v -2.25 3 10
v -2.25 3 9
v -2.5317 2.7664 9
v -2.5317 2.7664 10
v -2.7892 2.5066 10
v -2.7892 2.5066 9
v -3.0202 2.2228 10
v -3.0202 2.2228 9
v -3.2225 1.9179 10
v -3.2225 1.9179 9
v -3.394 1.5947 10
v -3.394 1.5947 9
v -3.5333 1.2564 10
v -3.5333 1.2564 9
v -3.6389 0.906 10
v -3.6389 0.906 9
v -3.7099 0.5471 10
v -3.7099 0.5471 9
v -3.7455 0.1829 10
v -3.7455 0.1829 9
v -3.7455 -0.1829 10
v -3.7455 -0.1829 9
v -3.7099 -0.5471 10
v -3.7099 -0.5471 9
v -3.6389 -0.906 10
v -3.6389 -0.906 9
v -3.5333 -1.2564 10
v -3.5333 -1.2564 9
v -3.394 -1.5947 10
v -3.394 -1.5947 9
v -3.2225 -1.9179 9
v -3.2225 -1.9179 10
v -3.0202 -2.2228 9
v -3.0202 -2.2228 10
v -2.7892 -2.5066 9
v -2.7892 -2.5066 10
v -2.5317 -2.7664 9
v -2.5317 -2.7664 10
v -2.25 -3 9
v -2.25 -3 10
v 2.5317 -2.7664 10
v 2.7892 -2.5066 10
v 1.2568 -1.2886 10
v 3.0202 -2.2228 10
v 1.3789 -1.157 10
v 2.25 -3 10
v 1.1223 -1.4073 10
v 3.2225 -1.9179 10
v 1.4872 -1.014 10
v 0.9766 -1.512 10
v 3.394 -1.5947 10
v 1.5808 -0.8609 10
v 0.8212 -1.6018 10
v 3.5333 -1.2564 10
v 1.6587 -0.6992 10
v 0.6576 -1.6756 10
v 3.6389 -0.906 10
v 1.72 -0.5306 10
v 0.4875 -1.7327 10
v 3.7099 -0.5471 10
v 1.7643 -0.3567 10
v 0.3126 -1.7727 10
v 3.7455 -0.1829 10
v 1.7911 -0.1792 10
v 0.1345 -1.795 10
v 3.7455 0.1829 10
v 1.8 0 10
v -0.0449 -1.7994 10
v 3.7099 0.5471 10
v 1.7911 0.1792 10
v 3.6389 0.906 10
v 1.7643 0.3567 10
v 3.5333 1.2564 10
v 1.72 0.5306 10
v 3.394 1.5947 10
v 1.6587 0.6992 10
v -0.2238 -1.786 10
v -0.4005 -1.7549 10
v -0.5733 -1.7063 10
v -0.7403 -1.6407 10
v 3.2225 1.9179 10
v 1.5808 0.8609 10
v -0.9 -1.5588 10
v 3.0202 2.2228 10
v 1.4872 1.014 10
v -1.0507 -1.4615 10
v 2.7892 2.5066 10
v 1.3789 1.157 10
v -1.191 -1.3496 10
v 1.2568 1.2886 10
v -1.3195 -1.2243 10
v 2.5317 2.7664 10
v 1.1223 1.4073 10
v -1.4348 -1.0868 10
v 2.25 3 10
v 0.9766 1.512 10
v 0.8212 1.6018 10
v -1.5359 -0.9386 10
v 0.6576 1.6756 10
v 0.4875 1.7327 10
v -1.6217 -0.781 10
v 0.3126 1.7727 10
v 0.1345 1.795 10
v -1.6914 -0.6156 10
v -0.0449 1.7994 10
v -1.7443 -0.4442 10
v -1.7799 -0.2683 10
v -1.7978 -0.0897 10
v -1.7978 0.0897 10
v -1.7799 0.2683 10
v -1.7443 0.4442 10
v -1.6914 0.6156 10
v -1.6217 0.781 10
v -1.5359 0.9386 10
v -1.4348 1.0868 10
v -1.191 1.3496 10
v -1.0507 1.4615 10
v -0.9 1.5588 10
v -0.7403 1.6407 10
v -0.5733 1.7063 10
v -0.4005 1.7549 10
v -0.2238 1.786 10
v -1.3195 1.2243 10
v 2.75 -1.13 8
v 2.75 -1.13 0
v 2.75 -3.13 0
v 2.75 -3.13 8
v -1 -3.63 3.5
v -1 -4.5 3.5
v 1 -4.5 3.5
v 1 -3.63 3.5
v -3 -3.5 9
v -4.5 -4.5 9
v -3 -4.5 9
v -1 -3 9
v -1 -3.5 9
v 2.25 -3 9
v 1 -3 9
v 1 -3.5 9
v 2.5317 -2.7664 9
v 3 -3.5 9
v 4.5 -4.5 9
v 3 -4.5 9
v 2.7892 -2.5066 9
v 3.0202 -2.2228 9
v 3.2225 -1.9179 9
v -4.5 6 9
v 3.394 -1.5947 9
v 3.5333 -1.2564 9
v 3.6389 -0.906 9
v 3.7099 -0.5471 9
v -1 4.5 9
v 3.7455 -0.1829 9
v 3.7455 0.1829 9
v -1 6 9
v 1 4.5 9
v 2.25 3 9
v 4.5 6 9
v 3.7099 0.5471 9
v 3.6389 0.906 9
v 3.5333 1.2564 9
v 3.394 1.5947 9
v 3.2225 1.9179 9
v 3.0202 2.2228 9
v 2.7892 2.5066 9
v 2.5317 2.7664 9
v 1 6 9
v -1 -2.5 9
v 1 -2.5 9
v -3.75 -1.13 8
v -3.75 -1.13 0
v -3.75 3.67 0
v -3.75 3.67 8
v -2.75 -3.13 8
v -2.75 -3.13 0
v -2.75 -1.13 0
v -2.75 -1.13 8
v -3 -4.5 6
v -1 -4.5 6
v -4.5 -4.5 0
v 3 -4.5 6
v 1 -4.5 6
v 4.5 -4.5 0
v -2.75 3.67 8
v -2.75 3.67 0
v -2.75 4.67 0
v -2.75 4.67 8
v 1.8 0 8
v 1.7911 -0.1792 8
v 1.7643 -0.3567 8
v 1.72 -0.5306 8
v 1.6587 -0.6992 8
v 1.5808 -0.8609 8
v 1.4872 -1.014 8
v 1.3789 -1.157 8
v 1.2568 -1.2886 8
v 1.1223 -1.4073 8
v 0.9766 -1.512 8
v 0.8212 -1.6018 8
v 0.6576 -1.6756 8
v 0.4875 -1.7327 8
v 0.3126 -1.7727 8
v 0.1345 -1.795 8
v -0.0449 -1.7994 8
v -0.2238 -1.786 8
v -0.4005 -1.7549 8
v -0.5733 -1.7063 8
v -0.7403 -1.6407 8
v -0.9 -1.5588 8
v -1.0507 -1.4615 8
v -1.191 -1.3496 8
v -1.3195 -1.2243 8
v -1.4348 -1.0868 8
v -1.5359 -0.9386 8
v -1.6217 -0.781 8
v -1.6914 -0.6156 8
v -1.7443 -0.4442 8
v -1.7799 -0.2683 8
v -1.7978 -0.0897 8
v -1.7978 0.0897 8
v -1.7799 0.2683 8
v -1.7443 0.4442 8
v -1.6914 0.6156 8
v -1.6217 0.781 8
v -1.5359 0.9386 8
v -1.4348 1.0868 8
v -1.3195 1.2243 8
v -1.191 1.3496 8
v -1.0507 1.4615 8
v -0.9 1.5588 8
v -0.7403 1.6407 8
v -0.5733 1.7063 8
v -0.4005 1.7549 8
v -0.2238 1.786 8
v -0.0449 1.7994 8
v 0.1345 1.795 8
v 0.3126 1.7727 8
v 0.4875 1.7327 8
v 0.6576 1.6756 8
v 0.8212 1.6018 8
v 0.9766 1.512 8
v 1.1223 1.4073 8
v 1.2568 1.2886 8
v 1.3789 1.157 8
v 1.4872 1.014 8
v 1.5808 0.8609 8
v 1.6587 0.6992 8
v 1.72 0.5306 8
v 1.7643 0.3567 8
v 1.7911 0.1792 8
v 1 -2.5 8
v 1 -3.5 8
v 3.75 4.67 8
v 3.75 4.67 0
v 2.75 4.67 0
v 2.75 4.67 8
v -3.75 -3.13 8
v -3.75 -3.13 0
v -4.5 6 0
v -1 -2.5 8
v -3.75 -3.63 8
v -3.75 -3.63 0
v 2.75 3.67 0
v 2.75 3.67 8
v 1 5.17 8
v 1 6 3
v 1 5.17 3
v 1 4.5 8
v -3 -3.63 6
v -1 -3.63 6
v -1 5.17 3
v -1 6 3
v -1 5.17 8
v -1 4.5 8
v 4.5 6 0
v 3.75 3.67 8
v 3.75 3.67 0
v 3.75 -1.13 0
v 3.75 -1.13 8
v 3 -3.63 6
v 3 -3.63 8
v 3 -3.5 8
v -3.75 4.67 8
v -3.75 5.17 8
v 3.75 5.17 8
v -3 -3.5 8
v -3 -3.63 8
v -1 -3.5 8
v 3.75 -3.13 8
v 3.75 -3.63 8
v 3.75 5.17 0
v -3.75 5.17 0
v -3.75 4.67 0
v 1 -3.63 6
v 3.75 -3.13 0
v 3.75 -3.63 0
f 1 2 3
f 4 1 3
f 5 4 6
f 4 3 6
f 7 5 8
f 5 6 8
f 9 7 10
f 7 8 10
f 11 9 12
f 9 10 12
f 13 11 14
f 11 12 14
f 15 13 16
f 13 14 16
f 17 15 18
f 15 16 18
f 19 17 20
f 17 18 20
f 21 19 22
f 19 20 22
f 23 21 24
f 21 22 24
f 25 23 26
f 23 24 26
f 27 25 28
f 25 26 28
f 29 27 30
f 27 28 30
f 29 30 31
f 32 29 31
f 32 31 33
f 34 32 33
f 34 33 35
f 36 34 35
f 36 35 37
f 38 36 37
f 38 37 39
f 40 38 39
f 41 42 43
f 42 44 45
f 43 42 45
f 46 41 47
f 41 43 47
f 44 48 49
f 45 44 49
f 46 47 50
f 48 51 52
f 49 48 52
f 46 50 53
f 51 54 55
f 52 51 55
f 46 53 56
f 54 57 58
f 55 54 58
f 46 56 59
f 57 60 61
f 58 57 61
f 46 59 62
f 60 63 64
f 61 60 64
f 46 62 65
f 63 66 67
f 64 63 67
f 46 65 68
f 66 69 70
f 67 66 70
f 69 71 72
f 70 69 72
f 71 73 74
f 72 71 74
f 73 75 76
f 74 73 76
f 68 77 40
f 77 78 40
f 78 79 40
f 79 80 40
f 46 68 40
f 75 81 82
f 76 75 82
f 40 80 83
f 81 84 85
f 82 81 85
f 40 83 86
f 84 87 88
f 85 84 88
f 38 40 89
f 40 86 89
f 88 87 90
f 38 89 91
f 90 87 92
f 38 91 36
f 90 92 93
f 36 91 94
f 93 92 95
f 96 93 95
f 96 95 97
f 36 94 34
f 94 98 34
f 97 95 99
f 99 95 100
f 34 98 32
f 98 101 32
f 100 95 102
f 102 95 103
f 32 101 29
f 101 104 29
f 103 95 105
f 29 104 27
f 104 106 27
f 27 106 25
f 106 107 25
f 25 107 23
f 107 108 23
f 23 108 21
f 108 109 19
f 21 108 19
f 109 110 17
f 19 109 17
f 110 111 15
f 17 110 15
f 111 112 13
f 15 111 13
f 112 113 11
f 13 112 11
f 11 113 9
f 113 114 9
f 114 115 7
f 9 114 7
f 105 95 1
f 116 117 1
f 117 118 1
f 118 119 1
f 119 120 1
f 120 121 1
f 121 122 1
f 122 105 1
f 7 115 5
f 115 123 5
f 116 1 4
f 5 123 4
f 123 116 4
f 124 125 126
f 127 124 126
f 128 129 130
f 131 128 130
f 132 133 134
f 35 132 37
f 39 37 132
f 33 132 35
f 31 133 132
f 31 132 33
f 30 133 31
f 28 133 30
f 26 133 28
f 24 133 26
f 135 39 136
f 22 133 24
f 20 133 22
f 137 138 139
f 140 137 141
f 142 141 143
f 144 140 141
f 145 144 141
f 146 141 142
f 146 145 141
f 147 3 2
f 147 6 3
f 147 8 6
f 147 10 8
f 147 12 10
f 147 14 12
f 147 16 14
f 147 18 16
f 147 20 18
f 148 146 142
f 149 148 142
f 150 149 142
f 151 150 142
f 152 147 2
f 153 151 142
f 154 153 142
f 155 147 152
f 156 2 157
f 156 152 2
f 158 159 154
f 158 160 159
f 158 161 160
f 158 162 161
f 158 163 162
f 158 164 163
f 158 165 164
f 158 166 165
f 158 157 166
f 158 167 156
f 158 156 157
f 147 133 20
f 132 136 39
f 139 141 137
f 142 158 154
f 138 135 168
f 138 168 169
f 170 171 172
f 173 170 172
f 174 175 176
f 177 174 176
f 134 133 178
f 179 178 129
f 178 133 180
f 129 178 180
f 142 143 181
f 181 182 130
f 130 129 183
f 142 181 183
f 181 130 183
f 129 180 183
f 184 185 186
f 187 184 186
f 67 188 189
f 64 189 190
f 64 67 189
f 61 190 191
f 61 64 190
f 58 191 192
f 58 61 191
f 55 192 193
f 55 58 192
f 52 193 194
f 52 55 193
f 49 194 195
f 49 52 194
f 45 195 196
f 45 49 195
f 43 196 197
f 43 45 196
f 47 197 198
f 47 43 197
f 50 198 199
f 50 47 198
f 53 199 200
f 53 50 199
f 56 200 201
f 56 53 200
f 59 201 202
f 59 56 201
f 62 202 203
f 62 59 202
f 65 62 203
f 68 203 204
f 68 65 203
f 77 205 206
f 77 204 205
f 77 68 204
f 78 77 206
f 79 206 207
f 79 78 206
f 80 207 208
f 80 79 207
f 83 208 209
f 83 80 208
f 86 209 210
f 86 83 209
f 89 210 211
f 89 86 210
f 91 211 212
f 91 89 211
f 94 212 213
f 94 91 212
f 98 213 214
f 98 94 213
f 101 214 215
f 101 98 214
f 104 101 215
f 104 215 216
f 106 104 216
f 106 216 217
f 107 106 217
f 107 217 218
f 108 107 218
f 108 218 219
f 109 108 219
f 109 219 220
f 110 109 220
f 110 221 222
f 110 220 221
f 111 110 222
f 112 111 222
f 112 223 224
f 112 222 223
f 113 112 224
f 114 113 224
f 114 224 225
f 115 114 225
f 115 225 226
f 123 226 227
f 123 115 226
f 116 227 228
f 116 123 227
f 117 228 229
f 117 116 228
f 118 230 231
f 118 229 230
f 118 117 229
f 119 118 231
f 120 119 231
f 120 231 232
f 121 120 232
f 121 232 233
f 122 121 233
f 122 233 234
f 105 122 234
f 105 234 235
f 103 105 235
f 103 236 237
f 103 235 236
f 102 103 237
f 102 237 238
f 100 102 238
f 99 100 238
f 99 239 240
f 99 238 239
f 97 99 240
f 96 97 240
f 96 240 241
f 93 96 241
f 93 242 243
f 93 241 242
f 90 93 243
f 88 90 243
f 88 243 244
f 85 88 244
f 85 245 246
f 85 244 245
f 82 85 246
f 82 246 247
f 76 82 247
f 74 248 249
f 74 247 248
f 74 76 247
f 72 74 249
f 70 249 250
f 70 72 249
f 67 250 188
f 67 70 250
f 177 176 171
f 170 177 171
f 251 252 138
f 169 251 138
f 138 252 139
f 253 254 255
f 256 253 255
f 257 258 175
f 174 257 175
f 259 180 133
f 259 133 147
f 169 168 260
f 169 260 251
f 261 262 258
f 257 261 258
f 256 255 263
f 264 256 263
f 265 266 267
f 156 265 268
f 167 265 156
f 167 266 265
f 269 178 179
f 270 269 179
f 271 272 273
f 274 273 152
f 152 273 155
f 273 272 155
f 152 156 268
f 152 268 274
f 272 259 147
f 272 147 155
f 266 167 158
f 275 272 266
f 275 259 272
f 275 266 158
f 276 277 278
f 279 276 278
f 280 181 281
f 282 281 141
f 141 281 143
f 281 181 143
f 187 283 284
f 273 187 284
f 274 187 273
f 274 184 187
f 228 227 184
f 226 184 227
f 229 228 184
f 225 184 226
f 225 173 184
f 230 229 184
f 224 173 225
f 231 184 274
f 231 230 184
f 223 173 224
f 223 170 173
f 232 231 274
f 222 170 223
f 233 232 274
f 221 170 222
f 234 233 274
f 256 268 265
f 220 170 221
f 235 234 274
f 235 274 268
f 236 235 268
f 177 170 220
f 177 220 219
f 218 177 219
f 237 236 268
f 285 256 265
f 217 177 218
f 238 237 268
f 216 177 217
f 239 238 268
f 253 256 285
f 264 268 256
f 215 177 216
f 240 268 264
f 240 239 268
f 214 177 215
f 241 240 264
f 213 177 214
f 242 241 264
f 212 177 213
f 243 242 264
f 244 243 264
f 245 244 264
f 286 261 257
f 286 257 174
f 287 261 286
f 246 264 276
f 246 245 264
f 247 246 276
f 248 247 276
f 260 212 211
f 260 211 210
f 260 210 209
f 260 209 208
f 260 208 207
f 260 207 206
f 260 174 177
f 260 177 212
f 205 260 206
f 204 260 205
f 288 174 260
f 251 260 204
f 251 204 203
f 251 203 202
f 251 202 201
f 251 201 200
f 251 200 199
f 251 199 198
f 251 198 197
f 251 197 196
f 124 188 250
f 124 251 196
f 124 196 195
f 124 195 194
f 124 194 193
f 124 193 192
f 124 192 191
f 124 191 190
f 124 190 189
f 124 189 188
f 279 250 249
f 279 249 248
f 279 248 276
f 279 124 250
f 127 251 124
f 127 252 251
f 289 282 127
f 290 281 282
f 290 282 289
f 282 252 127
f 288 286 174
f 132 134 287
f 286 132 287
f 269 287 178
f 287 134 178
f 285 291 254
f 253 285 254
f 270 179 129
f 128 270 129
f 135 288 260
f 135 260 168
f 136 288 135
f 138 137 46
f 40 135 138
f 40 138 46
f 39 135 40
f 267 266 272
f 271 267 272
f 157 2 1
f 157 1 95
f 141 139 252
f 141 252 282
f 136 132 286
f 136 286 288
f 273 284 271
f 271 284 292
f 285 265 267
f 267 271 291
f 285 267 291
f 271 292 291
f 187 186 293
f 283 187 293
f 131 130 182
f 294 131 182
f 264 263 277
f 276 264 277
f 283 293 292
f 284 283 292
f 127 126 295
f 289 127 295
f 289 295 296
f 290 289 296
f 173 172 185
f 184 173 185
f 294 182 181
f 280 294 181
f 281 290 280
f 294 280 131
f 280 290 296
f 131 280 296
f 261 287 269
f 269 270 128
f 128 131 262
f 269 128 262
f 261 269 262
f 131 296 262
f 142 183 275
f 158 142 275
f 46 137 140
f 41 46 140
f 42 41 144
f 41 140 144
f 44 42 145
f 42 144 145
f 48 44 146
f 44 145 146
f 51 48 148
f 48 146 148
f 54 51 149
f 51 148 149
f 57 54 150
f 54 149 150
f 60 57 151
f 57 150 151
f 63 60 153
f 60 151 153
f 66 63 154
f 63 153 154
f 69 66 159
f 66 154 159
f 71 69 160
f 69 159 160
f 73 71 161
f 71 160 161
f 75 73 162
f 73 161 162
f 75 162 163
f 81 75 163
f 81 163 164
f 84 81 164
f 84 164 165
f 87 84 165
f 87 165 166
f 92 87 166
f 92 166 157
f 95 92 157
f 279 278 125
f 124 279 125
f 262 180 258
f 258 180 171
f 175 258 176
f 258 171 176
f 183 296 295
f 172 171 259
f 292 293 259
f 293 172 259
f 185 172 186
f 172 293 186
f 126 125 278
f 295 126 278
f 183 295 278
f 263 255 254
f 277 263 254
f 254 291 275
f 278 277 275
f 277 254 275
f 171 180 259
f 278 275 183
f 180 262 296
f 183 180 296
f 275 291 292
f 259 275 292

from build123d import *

# Parameters (mm, degrees)
SKETCH_W        = 9
SKETCH_H        = 10.5
PAD_DEPTH       = 9
POCKET_DEPTH    = 8
PAD001_DEPTH    = 1
SKETCH004_W     = 2
SKETCH004_H     = 6
POCKET002_DEPTH = 1.5
SKETCH007_R     = 1.8
POCKET011_DEPTH = 10.001
POCKET012_DEPTH = 1
SKETCH033_W     = 2
SKETCH033_H     = 1
POCKET013_DEPTH = 1


with BuildPart() as part:
    # Sketch → Pad (new body)
    with BuildSketch(Plane.XY):
        with Locations((0, 0.75)):
            Rectangle(SKETCH_W, SKETCH_H)
    extrude(amount=PAD_DEPTH)

    # Sketch001 (on Face5 of Pad) → Pocket (cut)
    with BuildSketch(Plane(origin=(0, 0, 0), x_dir=(1, 0, 0), z_dir=(0, 0, -1))):
        Polygon((-3.75, 3.63), (-3.75, 3.13), (-2.75, 3.13), (-2.75, 1.13), (-3.75, 1.13), (-3.75, -3.67), (-2.75, -3.67), (-2.75, -4.67), (-3.75, -4.67), (-3.75, -5.17), (3.75, -5.17), (3.75, -4.67), (2.75, -4.67), (2.75, -3.67), (3.75, -3.67), (3.75, 1.13), (2.75, 1.13), (2.75, 3.13), (3.75, 3.13), (3.75, 3.63), align=None)
    extrude(amount=-POCKET_DEPTH, mode=Mode.SUBTRACT)

    # Sketch002 (on Face5 of Pocket) → Pad001 (join)
    with BuildSketch(Plane.XY.offset(9)):
        with BuildLine():
            Line((-2.25, 3), (2.25, 3))
            ThreePointArc((2.25, -3), (3.75, 0), (2.25, 3))
            Line((2.25, -3), (-2.25, -3))
            ThreePointArc((-2.25, 3), (-3.75, 0), (-2.25, -3))
        make_face()
    extrude(amount=PAD001_DEPTH)

    # Sketch004 → Pocket002 (cut)
    with BuildSketch(Plane(origin=(0, 6, 0), x_dir=(-1, 0, 0), z_dir=(0, 1, 0))):
        with Locations((0, 6)):
            Rectangle(SKETCH004_W, SKETCH004_H)
    extrude(amount=-POCKET002_DEPTH, mode=Mode.SUBTRACT)

    # Sketch007 → Pocket011 (cut, through all)
    with BuildSketch(Plane(origin=(0, 0, 10), x_dir=(1, 0, 0), z_dir=(0, 0, -1))):
        Circle(SKETCH007_R)
    extrude(amount=POCKET011_DEPTH, mode=Mode.SUBTRACT)

    # Sketch032 (on Face9 of Pocket011) → Pocket012 (cut)
    with BuildSketch(Plane.XZ.offset(4.5)):
        Polygon((-3, 9), (-3, 6), (-1, 6), (-1, 3.5), (1, 3.5), (1, 6), (3, 6), (3, 9), align=None)
    extrude(amount=-POCKET012_DEPTH, mode=Mode.SUBTRACT)

    # Sketch033 (on Face31 of Pocket012) → Pocket013 (cut)
    with BuildSketch(Plane.XZ.offset(3.5)):
        with Locations((0, 8.5)):
            Rectangle(SKETCH033_W, SKETCH033_H)
    extrude(amount=-POCKET013_DEPTH, mode=Mode.SUBTRACT)


solid = part.part
